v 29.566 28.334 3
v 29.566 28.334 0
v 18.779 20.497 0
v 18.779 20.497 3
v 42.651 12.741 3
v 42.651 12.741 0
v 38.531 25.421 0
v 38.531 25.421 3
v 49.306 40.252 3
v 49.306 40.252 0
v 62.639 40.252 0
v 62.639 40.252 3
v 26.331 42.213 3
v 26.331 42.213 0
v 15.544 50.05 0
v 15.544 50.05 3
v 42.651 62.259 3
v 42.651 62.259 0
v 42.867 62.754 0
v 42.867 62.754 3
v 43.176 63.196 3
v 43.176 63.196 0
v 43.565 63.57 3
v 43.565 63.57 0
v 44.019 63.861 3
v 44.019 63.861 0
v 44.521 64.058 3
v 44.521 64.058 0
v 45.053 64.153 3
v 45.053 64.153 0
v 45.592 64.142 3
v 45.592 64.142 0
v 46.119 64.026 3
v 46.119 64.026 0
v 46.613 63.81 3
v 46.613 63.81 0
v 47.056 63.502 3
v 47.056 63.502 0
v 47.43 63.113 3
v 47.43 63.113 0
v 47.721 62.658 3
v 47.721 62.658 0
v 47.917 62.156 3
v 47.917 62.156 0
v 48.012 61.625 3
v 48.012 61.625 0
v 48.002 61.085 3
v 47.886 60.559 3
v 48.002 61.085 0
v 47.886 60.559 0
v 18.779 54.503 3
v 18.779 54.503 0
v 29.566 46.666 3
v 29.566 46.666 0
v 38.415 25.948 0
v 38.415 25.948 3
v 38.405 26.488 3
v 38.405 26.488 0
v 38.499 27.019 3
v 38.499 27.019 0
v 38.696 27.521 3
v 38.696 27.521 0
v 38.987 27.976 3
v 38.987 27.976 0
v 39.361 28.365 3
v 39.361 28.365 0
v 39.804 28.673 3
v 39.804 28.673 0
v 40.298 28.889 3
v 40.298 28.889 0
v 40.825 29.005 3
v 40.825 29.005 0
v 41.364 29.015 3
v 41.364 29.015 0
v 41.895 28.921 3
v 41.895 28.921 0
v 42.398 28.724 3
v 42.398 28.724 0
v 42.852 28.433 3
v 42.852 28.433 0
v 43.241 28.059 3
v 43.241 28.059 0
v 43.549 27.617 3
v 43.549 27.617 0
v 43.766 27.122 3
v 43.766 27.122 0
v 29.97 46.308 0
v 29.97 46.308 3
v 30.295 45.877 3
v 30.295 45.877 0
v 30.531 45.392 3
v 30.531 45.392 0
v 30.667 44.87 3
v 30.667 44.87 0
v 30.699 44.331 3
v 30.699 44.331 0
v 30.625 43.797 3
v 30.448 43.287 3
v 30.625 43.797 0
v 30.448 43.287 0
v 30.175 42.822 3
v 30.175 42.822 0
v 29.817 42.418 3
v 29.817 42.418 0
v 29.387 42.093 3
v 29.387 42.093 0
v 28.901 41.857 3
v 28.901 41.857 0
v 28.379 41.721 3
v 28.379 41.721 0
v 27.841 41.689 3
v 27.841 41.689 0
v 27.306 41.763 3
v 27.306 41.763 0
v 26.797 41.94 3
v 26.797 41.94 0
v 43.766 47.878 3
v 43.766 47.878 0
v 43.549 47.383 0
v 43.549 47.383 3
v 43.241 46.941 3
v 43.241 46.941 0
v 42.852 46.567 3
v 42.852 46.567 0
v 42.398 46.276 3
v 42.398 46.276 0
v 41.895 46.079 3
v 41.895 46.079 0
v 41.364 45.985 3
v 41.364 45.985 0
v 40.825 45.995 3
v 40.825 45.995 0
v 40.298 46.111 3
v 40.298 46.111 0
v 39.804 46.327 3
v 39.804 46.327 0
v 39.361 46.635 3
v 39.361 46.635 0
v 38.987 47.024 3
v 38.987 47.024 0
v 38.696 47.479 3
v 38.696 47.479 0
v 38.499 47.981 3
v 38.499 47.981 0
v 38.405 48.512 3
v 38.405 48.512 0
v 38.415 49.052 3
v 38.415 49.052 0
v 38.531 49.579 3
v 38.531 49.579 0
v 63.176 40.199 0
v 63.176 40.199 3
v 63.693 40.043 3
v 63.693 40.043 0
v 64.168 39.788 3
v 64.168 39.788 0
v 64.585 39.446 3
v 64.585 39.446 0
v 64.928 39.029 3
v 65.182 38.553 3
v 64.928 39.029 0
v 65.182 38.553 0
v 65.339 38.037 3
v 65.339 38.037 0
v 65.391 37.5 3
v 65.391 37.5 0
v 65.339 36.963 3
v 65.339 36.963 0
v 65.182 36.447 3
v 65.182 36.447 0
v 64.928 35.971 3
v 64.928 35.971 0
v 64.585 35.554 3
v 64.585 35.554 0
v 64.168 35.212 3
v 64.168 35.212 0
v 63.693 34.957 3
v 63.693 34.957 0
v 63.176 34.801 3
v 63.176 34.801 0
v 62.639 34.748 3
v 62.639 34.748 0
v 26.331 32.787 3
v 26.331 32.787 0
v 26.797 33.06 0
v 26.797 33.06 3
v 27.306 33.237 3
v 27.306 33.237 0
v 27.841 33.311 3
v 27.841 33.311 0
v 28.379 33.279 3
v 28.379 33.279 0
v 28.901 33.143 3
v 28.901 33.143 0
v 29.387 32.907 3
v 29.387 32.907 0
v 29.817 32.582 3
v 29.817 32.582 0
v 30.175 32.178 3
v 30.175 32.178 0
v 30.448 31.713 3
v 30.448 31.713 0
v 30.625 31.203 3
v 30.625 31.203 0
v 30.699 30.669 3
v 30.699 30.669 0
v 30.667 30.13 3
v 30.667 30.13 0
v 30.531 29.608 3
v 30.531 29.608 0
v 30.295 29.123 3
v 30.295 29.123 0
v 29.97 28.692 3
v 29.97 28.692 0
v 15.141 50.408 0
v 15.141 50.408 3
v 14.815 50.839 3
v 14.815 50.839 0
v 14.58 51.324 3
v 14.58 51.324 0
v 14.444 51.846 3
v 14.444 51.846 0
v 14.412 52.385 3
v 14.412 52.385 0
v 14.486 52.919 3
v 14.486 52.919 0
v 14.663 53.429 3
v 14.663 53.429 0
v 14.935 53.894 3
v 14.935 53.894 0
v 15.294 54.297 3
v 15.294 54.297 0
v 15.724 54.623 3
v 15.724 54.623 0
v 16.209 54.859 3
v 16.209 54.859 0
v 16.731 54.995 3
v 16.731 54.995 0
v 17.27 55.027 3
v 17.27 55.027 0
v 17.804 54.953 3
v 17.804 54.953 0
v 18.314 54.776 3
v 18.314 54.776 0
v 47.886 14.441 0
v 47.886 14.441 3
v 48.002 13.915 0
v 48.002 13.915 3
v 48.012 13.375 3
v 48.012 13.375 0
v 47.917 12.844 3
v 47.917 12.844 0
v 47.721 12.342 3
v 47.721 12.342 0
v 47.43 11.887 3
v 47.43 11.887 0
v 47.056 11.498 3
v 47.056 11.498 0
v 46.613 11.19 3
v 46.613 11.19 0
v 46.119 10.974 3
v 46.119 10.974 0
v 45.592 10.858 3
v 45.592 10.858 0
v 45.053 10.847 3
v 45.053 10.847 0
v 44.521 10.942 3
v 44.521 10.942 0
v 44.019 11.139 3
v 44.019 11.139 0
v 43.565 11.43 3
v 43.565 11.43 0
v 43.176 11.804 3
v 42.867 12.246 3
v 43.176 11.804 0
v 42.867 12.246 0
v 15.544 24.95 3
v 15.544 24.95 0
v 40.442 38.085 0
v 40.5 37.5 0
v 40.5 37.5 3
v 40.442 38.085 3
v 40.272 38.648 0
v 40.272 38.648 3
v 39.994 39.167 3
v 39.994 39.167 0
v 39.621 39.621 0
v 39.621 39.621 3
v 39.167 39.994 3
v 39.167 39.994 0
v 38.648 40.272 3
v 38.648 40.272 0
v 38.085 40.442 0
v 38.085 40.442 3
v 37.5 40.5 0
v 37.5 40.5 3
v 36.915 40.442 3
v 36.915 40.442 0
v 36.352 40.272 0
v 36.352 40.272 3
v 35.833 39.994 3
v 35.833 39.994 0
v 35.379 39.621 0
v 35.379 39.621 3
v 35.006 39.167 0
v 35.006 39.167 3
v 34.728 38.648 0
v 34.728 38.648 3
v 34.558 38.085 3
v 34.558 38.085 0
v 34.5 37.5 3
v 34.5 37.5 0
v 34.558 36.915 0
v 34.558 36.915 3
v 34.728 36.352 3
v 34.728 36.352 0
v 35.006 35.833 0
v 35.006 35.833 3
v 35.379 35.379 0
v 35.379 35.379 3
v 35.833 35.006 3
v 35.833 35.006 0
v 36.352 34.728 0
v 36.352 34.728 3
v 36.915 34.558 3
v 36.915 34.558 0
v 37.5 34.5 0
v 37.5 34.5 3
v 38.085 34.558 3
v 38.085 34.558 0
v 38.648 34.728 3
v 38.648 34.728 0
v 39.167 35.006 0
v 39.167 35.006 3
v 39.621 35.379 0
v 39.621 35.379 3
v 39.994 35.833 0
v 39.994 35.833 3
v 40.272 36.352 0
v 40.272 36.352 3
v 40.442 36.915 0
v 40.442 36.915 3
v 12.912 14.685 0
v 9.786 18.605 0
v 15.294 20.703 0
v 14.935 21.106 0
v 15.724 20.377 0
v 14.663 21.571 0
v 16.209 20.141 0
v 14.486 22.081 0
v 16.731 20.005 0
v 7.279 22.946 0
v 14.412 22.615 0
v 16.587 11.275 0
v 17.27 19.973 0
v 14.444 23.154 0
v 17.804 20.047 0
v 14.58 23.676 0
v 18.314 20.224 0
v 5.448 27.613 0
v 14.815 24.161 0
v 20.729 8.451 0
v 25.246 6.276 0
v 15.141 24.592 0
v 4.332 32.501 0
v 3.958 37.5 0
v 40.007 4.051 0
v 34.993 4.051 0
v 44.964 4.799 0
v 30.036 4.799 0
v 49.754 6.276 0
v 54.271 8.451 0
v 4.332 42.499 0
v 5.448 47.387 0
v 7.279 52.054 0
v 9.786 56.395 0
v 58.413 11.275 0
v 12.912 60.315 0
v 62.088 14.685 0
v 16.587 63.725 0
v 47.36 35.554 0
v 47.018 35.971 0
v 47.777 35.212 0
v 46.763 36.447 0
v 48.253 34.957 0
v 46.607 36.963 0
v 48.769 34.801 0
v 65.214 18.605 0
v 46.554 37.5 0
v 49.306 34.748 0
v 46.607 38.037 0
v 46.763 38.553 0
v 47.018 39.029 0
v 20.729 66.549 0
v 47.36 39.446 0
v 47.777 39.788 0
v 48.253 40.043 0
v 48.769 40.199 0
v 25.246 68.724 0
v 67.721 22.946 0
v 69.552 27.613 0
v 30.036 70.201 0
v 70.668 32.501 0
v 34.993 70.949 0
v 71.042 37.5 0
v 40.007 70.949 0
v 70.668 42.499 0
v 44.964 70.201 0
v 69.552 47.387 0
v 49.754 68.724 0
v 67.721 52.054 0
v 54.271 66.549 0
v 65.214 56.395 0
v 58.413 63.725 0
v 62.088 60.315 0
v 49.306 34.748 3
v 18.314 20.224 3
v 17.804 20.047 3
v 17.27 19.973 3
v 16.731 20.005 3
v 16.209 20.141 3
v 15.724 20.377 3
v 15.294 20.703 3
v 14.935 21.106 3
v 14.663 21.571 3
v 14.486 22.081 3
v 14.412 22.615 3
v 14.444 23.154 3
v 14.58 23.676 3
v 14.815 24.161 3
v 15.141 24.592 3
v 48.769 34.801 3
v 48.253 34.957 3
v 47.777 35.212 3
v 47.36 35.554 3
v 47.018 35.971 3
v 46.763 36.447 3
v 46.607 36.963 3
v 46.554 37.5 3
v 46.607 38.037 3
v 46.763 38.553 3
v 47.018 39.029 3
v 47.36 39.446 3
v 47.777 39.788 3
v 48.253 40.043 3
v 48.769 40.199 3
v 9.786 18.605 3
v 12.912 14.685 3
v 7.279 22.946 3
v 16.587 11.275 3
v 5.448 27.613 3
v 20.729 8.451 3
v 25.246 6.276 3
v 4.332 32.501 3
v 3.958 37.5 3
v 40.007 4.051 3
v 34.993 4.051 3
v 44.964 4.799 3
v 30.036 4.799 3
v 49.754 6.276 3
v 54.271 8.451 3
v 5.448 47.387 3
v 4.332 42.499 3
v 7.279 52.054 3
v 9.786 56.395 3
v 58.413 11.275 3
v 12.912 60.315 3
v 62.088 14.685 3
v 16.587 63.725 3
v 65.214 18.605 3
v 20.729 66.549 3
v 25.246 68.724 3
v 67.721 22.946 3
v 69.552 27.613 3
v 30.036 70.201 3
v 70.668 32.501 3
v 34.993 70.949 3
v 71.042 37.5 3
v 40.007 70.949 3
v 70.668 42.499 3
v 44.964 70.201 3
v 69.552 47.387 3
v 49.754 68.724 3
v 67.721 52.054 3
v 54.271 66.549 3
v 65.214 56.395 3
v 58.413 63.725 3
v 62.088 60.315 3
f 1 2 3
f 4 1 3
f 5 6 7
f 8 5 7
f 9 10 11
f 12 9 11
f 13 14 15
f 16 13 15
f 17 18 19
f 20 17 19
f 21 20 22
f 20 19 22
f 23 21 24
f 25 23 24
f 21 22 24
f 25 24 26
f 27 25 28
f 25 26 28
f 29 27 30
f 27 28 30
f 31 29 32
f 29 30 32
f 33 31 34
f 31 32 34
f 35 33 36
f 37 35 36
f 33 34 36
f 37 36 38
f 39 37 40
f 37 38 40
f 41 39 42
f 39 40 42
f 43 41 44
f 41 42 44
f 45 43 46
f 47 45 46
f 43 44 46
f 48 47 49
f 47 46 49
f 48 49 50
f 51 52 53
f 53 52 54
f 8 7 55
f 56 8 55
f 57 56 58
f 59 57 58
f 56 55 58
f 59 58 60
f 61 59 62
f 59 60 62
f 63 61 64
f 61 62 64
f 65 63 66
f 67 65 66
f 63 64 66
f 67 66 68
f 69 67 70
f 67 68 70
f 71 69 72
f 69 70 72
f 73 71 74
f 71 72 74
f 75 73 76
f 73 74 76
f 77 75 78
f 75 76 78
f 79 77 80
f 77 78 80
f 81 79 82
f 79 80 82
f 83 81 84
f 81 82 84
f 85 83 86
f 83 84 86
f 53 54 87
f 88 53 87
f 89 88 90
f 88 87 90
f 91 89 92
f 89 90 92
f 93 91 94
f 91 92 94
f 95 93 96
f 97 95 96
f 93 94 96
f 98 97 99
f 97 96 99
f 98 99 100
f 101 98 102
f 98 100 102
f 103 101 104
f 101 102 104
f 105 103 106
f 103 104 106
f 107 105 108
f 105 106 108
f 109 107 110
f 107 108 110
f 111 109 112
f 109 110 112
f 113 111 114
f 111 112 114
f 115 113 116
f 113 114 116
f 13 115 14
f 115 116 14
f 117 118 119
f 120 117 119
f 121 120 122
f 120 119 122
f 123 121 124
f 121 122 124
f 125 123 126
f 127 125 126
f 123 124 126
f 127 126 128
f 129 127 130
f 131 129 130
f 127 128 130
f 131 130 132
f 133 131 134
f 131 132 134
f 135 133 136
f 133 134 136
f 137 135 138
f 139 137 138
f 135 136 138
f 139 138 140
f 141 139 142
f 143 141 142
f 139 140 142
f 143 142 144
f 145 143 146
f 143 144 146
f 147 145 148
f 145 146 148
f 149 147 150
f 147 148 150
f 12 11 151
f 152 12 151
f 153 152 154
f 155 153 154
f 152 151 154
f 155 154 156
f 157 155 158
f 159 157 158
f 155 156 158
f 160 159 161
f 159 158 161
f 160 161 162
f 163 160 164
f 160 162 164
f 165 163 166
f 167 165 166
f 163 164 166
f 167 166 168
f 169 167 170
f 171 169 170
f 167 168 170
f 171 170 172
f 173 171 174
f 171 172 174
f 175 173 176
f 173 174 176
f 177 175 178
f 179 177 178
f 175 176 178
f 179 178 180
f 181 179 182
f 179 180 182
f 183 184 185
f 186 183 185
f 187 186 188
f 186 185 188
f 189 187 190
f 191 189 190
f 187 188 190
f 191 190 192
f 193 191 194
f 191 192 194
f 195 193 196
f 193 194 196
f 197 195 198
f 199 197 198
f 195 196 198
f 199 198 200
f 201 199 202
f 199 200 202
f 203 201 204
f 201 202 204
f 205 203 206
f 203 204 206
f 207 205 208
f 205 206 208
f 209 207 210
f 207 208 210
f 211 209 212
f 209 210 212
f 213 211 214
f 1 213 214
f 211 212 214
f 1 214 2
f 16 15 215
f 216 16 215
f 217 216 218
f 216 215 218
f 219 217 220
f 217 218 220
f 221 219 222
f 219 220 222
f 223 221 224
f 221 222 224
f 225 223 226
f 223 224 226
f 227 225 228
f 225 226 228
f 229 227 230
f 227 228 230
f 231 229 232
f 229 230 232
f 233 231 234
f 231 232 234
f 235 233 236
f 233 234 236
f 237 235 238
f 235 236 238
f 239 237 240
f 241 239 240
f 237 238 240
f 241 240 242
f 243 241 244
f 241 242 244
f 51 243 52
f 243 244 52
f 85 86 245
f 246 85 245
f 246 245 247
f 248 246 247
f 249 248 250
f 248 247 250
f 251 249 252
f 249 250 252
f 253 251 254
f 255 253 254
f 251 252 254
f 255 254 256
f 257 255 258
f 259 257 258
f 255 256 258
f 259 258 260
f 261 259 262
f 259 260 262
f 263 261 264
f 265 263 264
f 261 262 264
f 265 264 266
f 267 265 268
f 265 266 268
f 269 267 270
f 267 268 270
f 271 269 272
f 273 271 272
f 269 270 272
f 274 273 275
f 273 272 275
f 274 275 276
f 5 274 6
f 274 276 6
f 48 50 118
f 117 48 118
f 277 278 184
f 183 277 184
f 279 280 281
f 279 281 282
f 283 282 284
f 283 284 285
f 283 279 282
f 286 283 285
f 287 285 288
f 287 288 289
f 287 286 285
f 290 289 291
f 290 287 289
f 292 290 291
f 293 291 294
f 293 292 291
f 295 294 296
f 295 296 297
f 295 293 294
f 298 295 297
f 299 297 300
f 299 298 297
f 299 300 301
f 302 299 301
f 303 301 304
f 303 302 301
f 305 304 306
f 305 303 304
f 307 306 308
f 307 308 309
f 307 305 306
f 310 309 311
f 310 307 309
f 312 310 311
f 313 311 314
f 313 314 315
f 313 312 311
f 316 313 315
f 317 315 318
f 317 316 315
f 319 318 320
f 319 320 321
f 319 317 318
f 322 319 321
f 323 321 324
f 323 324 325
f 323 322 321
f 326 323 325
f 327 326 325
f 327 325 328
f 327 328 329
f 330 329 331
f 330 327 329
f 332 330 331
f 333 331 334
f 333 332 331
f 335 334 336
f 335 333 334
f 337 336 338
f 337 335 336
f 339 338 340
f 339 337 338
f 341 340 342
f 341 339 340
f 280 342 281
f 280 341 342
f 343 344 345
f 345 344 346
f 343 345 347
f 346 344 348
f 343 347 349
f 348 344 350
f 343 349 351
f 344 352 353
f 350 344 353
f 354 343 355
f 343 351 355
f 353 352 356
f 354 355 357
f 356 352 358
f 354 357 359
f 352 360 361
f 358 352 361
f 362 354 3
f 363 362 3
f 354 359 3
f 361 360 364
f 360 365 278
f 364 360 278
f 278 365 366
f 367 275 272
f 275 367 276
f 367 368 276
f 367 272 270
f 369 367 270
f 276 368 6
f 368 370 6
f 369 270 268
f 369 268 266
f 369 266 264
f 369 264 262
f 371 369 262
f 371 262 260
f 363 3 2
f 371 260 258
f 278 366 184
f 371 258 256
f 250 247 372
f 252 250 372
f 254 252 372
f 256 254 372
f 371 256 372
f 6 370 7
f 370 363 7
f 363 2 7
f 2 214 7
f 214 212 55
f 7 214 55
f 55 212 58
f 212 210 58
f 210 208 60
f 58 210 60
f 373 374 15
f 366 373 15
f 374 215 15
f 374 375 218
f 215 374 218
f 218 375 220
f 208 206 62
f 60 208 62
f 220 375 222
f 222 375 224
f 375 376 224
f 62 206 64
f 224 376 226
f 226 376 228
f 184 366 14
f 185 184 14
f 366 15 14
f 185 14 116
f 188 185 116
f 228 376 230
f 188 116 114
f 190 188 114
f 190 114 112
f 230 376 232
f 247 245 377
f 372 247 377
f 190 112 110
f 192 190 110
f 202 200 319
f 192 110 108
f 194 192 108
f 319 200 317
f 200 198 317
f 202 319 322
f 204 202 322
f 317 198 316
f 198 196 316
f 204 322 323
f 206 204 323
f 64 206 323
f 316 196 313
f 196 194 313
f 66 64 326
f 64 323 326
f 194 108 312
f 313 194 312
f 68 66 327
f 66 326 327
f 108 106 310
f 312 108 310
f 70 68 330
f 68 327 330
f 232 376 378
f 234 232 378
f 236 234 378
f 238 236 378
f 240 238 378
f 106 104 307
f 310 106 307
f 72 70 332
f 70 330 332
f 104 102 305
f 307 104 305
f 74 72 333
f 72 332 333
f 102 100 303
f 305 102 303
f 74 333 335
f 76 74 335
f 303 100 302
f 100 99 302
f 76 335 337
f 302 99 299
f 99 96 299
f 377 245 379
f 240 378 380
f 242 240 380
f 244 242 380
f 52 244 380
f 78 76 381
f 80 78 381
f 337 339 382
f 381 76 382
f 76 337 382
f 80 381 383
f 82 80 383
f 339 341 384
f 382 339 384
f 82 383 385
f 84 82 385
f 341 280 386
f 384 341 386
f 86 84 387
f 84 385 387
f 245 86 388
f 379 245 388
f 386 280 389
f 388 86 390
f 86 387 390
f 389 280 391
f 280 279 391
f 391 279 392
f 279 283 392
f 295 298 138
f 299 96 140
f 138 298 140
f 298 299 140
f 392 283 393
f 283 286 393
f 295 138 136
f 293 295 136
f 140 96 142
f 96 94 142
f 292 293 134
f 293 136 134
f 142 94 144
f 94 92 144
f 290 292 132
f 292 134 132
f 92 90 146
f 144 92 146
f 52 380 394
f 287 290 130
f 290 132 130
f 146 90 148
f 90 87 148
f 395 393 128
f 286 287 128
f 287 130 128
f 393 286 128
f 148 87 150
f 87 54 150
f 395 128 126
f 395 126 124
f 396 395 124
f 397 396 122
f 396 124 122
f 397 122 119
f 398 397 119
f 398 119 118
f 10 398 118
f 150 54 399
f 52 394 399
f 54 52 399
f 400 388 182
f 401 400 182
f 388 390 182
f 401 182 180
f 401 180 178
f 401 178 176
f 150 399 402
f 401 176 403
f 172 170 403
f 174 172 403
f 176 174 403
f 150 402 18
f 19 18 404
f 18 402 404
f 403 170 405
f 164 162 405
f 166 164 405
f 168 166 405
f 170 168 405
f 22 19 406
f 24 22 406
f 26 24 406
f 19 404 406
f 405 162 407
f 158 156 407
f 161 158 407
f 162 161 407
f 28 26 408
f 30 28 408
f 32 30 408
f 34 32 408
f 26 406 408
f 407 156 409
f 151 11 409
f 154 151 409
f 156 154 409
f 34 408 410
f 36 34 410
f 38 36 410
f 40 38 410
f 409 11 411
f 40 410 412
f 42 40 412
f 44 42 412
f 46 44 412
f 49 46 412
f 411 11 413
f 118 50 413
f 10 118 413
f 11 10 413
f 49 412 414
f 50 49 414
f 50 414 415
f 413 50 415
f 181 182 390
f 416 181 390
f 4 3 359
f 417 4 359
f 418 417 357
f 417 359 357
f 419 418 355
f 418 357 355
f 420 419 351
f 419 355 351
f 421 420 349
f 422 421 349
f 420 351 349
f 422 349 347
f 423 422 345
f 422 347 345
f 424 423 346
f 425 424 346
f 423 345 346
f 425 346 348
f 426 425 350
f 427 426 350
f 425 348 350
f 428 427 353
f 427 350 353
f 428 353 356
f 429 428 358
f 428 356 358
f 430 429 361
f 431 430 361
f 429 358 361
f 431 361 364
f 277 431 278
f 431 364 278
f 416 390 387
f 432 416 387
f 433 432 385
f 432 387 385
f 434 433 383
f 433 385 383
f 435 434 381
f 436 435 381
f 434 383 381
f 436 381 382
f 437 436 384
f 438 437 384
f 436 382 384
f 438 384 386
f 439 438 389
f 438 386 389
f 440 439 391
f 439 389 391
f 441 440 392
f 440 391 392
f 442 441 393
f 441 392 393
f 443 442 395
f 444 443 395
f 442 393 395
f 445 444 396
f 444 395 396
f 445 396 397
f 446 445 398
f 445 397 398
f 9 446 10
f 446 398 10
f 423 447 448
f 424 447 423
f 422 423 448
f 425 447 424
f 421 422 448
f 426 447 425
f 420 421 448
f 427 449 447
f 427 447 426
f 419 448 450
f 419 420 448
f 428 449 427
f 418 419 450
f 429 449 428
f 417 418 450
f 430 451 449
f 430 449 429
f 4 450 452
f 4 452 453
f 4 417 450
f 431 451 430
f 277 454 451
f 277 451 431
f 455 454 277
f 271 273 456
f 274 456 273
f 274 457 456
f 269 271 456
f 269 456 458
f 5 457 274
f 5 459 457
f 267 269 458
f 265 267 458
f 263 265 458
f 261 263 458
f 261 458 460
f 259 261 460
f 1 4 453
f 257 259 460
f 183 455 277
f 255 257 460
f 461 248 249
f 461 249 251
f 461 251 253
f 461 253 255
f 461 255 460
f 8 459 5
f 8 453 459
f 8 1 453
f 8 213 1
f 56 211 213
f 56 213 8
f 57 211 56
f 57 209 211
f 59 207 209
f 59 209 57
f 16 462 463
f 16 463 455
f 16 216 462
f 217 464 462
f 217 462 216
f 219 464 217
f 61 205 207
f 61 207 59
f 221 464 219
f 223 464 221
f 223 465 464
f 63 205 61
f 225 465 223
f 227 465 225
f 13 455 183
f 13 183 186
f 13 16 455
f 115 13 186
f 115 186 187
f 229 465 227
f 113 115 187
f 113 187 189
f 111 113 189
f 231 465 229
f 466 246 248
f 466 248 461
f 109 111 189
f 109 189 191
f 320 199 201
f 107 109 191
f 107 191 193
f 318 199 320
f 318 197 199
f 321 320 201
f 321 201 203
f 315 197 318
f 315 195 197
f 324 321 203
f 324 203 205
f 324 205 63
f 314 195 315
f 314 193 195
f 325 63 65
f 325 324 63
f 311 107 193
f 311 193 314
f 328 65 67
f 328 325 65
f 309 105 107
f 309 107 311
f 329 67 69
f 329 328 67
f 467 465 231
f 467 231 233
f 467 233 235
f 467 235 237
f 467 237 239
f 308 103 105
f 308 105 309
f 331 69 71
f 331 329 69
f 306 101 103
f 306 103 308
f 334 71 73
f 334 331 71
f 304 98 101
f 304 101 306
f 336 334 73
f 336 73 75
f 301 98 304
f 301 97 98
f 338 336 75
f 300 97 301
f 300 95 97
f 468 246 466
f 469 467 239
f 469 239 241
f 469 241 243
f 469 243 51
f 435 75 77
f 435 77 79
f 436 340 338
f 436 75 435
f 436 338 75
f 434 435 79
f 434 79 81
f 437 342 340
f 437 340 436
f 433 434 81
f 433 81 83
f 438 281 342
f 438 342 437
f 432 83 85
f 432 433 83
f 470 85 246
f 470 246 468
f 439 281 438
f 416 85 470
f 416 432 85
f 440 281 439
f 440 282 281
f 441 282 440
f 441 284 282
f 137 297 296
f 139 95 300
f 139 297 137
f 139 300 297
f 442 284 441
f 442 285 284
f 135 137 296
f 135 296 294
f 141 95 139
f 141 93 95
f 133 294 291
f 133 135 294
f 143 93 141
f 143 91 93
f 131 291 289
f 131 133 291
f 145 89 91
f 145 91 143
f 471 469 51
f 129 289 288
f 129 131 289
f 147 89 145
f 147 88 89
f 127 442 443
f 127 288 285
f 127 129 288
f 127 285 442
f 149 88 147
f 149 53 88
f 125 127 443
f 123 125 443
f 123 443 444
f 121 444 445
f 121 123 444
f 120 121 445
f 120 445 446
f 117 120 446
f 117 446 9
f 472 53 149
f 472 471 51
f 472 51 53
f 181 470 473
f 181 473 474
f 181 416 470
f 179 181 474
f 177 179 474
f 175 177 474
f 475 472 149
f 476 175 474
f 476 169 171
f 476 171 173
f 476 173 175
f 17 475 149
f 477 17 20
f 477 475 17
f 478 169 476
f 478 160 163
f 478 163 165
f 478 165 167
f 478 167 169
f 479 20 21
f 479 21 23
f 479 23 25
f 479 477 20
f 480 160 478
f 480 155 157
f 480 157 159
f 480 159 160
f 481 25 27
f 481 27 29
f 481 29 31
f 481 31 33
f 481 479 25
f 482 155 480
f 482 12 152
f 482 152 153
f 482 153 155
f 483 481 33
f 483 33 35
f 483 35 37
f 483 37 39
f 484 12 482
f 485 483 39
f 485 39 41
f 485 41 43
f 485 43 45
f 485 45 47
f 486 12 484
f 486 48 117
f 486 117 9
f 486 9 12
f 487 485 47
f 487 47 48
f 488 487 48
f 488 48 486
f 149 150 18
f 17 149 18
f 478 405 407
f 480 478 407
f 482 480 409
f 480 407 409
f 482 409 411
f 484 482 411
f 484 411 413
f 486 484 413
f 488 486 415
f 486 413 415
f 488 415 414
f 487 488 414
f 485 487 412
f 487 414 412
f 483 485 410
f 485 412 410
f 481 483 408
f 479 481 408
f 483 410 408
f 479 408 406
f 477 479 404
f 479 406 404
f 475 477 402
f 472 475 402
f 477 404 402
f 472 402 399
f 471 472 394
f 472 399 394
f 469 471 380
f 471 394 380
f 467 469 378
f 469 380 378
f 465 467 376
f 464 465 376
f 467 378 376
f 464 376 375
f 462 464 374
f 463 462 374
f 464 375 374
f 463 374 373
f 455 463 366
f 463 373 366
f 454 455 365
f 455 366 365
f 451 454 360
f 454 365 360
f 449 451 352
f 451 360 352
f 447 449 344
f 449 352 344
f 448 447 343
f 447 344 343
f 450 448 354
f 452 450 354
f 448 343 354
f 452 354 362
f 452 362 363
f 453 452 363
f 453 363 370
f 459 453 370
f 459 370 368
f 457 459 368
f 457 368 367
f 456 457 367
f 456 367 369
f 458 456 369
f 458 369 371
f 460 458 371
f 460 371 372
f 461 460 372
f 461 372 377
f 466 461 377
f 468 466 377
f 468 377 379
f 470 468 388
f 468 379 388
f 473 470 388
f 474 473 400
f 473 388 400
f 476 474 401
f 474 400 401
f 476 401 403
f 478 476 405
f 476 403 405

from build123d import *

# Parameters (mm, degrees)
F0_R     = 33.542405
F0_R_2   = 3
F1_DEPTH = 3


with BuildPart() as f1:
    # F0 (on Top) → F1 (new body)
    with BuildSketch(Plane.XY):
        with Locations((37.5, 37.5)):
            Circle(F0_R)
        with BuildLine():
            ThreePointArc((18.779471, 20.496946), (14.93532, 21.1058), (15.544173, 24.949951))
            Line((15.544173, 24.949951), (26.331132, 32.787135))
            ThreePointArc((26.331132, 32.787135), (30.175283, 32.178281), (29.566429, 28.33413))
            Line((29.566429, 28.33413), (18.779471, 20.496946))
        make_face(mode=Mode.SUBTRACT)
        with BuildLine():
            ThreePointArc((47.885903, 14.441486), (46.118941, 10.973627), (42.651082, 12.74059))
            Line((42.651082, 12.74059), (38.530831, 25.42142))
            ThreePointArc((38.530831, 25.42142), (40.297793, 28.889278), (43.765652, 27.122316))
            Line((43.765652, 27.122316), (47.885903, 14.441486))
        make_face(mode=Mode.SUBTRACT)
        with BuildLine():
            ThreePointArc((49.305957, 34.747892), (46.553848, 37.5), (49.305957, 40.252108))
            Line((49.305957, 40.252108), (62.639371, 40.252108))
            ThreePointArc((62.639371, 40.252108), (65.391479, 37.5), (62.639371, 34.747892))
            Line((62.639371, 34.747892), (49.305957, 34.747892))
        make_face(mode=Mode.SUBTRACT)
        with BuildLine():
            ThreePointArc((15.544173, 50.050049), (14.93532, 53.8942), (18.779471, 54.503054))
            Line((18.779471, 54.503054), (29.566429, 46.66587))
            ThreePointArc((29.566429, 46.66587), (30.175283, 42.821719), (26.331132, 42.212865))
            Line((26.331132, 42.212865), (15.544173, 50.050049))
        make_face(mode=Mode.SUBTRACT)
        with Locations((37.5, 37.5)):
            Circle(F0_R_2, mode=Mode.SUBTRACT)
        with BuildLine():
            ThreePointArc((42.651082, 62.25941), (46.118941, 64.026373), (47.885903, 60.558514))
            Line((47.885903, 60.558514), (43.765652, 47.877684))
            ThreePointArc((43.765652, 47.877684), (40.297793, 46.110722), (38.530831, 49.57858))
            Line((38.530831, 49.57858), (42.651082, 62.25941))
        make_face(mode=Mode.SUBTRACT)
    extrude(amount=F1_DEPTH)


solid = f1.part
